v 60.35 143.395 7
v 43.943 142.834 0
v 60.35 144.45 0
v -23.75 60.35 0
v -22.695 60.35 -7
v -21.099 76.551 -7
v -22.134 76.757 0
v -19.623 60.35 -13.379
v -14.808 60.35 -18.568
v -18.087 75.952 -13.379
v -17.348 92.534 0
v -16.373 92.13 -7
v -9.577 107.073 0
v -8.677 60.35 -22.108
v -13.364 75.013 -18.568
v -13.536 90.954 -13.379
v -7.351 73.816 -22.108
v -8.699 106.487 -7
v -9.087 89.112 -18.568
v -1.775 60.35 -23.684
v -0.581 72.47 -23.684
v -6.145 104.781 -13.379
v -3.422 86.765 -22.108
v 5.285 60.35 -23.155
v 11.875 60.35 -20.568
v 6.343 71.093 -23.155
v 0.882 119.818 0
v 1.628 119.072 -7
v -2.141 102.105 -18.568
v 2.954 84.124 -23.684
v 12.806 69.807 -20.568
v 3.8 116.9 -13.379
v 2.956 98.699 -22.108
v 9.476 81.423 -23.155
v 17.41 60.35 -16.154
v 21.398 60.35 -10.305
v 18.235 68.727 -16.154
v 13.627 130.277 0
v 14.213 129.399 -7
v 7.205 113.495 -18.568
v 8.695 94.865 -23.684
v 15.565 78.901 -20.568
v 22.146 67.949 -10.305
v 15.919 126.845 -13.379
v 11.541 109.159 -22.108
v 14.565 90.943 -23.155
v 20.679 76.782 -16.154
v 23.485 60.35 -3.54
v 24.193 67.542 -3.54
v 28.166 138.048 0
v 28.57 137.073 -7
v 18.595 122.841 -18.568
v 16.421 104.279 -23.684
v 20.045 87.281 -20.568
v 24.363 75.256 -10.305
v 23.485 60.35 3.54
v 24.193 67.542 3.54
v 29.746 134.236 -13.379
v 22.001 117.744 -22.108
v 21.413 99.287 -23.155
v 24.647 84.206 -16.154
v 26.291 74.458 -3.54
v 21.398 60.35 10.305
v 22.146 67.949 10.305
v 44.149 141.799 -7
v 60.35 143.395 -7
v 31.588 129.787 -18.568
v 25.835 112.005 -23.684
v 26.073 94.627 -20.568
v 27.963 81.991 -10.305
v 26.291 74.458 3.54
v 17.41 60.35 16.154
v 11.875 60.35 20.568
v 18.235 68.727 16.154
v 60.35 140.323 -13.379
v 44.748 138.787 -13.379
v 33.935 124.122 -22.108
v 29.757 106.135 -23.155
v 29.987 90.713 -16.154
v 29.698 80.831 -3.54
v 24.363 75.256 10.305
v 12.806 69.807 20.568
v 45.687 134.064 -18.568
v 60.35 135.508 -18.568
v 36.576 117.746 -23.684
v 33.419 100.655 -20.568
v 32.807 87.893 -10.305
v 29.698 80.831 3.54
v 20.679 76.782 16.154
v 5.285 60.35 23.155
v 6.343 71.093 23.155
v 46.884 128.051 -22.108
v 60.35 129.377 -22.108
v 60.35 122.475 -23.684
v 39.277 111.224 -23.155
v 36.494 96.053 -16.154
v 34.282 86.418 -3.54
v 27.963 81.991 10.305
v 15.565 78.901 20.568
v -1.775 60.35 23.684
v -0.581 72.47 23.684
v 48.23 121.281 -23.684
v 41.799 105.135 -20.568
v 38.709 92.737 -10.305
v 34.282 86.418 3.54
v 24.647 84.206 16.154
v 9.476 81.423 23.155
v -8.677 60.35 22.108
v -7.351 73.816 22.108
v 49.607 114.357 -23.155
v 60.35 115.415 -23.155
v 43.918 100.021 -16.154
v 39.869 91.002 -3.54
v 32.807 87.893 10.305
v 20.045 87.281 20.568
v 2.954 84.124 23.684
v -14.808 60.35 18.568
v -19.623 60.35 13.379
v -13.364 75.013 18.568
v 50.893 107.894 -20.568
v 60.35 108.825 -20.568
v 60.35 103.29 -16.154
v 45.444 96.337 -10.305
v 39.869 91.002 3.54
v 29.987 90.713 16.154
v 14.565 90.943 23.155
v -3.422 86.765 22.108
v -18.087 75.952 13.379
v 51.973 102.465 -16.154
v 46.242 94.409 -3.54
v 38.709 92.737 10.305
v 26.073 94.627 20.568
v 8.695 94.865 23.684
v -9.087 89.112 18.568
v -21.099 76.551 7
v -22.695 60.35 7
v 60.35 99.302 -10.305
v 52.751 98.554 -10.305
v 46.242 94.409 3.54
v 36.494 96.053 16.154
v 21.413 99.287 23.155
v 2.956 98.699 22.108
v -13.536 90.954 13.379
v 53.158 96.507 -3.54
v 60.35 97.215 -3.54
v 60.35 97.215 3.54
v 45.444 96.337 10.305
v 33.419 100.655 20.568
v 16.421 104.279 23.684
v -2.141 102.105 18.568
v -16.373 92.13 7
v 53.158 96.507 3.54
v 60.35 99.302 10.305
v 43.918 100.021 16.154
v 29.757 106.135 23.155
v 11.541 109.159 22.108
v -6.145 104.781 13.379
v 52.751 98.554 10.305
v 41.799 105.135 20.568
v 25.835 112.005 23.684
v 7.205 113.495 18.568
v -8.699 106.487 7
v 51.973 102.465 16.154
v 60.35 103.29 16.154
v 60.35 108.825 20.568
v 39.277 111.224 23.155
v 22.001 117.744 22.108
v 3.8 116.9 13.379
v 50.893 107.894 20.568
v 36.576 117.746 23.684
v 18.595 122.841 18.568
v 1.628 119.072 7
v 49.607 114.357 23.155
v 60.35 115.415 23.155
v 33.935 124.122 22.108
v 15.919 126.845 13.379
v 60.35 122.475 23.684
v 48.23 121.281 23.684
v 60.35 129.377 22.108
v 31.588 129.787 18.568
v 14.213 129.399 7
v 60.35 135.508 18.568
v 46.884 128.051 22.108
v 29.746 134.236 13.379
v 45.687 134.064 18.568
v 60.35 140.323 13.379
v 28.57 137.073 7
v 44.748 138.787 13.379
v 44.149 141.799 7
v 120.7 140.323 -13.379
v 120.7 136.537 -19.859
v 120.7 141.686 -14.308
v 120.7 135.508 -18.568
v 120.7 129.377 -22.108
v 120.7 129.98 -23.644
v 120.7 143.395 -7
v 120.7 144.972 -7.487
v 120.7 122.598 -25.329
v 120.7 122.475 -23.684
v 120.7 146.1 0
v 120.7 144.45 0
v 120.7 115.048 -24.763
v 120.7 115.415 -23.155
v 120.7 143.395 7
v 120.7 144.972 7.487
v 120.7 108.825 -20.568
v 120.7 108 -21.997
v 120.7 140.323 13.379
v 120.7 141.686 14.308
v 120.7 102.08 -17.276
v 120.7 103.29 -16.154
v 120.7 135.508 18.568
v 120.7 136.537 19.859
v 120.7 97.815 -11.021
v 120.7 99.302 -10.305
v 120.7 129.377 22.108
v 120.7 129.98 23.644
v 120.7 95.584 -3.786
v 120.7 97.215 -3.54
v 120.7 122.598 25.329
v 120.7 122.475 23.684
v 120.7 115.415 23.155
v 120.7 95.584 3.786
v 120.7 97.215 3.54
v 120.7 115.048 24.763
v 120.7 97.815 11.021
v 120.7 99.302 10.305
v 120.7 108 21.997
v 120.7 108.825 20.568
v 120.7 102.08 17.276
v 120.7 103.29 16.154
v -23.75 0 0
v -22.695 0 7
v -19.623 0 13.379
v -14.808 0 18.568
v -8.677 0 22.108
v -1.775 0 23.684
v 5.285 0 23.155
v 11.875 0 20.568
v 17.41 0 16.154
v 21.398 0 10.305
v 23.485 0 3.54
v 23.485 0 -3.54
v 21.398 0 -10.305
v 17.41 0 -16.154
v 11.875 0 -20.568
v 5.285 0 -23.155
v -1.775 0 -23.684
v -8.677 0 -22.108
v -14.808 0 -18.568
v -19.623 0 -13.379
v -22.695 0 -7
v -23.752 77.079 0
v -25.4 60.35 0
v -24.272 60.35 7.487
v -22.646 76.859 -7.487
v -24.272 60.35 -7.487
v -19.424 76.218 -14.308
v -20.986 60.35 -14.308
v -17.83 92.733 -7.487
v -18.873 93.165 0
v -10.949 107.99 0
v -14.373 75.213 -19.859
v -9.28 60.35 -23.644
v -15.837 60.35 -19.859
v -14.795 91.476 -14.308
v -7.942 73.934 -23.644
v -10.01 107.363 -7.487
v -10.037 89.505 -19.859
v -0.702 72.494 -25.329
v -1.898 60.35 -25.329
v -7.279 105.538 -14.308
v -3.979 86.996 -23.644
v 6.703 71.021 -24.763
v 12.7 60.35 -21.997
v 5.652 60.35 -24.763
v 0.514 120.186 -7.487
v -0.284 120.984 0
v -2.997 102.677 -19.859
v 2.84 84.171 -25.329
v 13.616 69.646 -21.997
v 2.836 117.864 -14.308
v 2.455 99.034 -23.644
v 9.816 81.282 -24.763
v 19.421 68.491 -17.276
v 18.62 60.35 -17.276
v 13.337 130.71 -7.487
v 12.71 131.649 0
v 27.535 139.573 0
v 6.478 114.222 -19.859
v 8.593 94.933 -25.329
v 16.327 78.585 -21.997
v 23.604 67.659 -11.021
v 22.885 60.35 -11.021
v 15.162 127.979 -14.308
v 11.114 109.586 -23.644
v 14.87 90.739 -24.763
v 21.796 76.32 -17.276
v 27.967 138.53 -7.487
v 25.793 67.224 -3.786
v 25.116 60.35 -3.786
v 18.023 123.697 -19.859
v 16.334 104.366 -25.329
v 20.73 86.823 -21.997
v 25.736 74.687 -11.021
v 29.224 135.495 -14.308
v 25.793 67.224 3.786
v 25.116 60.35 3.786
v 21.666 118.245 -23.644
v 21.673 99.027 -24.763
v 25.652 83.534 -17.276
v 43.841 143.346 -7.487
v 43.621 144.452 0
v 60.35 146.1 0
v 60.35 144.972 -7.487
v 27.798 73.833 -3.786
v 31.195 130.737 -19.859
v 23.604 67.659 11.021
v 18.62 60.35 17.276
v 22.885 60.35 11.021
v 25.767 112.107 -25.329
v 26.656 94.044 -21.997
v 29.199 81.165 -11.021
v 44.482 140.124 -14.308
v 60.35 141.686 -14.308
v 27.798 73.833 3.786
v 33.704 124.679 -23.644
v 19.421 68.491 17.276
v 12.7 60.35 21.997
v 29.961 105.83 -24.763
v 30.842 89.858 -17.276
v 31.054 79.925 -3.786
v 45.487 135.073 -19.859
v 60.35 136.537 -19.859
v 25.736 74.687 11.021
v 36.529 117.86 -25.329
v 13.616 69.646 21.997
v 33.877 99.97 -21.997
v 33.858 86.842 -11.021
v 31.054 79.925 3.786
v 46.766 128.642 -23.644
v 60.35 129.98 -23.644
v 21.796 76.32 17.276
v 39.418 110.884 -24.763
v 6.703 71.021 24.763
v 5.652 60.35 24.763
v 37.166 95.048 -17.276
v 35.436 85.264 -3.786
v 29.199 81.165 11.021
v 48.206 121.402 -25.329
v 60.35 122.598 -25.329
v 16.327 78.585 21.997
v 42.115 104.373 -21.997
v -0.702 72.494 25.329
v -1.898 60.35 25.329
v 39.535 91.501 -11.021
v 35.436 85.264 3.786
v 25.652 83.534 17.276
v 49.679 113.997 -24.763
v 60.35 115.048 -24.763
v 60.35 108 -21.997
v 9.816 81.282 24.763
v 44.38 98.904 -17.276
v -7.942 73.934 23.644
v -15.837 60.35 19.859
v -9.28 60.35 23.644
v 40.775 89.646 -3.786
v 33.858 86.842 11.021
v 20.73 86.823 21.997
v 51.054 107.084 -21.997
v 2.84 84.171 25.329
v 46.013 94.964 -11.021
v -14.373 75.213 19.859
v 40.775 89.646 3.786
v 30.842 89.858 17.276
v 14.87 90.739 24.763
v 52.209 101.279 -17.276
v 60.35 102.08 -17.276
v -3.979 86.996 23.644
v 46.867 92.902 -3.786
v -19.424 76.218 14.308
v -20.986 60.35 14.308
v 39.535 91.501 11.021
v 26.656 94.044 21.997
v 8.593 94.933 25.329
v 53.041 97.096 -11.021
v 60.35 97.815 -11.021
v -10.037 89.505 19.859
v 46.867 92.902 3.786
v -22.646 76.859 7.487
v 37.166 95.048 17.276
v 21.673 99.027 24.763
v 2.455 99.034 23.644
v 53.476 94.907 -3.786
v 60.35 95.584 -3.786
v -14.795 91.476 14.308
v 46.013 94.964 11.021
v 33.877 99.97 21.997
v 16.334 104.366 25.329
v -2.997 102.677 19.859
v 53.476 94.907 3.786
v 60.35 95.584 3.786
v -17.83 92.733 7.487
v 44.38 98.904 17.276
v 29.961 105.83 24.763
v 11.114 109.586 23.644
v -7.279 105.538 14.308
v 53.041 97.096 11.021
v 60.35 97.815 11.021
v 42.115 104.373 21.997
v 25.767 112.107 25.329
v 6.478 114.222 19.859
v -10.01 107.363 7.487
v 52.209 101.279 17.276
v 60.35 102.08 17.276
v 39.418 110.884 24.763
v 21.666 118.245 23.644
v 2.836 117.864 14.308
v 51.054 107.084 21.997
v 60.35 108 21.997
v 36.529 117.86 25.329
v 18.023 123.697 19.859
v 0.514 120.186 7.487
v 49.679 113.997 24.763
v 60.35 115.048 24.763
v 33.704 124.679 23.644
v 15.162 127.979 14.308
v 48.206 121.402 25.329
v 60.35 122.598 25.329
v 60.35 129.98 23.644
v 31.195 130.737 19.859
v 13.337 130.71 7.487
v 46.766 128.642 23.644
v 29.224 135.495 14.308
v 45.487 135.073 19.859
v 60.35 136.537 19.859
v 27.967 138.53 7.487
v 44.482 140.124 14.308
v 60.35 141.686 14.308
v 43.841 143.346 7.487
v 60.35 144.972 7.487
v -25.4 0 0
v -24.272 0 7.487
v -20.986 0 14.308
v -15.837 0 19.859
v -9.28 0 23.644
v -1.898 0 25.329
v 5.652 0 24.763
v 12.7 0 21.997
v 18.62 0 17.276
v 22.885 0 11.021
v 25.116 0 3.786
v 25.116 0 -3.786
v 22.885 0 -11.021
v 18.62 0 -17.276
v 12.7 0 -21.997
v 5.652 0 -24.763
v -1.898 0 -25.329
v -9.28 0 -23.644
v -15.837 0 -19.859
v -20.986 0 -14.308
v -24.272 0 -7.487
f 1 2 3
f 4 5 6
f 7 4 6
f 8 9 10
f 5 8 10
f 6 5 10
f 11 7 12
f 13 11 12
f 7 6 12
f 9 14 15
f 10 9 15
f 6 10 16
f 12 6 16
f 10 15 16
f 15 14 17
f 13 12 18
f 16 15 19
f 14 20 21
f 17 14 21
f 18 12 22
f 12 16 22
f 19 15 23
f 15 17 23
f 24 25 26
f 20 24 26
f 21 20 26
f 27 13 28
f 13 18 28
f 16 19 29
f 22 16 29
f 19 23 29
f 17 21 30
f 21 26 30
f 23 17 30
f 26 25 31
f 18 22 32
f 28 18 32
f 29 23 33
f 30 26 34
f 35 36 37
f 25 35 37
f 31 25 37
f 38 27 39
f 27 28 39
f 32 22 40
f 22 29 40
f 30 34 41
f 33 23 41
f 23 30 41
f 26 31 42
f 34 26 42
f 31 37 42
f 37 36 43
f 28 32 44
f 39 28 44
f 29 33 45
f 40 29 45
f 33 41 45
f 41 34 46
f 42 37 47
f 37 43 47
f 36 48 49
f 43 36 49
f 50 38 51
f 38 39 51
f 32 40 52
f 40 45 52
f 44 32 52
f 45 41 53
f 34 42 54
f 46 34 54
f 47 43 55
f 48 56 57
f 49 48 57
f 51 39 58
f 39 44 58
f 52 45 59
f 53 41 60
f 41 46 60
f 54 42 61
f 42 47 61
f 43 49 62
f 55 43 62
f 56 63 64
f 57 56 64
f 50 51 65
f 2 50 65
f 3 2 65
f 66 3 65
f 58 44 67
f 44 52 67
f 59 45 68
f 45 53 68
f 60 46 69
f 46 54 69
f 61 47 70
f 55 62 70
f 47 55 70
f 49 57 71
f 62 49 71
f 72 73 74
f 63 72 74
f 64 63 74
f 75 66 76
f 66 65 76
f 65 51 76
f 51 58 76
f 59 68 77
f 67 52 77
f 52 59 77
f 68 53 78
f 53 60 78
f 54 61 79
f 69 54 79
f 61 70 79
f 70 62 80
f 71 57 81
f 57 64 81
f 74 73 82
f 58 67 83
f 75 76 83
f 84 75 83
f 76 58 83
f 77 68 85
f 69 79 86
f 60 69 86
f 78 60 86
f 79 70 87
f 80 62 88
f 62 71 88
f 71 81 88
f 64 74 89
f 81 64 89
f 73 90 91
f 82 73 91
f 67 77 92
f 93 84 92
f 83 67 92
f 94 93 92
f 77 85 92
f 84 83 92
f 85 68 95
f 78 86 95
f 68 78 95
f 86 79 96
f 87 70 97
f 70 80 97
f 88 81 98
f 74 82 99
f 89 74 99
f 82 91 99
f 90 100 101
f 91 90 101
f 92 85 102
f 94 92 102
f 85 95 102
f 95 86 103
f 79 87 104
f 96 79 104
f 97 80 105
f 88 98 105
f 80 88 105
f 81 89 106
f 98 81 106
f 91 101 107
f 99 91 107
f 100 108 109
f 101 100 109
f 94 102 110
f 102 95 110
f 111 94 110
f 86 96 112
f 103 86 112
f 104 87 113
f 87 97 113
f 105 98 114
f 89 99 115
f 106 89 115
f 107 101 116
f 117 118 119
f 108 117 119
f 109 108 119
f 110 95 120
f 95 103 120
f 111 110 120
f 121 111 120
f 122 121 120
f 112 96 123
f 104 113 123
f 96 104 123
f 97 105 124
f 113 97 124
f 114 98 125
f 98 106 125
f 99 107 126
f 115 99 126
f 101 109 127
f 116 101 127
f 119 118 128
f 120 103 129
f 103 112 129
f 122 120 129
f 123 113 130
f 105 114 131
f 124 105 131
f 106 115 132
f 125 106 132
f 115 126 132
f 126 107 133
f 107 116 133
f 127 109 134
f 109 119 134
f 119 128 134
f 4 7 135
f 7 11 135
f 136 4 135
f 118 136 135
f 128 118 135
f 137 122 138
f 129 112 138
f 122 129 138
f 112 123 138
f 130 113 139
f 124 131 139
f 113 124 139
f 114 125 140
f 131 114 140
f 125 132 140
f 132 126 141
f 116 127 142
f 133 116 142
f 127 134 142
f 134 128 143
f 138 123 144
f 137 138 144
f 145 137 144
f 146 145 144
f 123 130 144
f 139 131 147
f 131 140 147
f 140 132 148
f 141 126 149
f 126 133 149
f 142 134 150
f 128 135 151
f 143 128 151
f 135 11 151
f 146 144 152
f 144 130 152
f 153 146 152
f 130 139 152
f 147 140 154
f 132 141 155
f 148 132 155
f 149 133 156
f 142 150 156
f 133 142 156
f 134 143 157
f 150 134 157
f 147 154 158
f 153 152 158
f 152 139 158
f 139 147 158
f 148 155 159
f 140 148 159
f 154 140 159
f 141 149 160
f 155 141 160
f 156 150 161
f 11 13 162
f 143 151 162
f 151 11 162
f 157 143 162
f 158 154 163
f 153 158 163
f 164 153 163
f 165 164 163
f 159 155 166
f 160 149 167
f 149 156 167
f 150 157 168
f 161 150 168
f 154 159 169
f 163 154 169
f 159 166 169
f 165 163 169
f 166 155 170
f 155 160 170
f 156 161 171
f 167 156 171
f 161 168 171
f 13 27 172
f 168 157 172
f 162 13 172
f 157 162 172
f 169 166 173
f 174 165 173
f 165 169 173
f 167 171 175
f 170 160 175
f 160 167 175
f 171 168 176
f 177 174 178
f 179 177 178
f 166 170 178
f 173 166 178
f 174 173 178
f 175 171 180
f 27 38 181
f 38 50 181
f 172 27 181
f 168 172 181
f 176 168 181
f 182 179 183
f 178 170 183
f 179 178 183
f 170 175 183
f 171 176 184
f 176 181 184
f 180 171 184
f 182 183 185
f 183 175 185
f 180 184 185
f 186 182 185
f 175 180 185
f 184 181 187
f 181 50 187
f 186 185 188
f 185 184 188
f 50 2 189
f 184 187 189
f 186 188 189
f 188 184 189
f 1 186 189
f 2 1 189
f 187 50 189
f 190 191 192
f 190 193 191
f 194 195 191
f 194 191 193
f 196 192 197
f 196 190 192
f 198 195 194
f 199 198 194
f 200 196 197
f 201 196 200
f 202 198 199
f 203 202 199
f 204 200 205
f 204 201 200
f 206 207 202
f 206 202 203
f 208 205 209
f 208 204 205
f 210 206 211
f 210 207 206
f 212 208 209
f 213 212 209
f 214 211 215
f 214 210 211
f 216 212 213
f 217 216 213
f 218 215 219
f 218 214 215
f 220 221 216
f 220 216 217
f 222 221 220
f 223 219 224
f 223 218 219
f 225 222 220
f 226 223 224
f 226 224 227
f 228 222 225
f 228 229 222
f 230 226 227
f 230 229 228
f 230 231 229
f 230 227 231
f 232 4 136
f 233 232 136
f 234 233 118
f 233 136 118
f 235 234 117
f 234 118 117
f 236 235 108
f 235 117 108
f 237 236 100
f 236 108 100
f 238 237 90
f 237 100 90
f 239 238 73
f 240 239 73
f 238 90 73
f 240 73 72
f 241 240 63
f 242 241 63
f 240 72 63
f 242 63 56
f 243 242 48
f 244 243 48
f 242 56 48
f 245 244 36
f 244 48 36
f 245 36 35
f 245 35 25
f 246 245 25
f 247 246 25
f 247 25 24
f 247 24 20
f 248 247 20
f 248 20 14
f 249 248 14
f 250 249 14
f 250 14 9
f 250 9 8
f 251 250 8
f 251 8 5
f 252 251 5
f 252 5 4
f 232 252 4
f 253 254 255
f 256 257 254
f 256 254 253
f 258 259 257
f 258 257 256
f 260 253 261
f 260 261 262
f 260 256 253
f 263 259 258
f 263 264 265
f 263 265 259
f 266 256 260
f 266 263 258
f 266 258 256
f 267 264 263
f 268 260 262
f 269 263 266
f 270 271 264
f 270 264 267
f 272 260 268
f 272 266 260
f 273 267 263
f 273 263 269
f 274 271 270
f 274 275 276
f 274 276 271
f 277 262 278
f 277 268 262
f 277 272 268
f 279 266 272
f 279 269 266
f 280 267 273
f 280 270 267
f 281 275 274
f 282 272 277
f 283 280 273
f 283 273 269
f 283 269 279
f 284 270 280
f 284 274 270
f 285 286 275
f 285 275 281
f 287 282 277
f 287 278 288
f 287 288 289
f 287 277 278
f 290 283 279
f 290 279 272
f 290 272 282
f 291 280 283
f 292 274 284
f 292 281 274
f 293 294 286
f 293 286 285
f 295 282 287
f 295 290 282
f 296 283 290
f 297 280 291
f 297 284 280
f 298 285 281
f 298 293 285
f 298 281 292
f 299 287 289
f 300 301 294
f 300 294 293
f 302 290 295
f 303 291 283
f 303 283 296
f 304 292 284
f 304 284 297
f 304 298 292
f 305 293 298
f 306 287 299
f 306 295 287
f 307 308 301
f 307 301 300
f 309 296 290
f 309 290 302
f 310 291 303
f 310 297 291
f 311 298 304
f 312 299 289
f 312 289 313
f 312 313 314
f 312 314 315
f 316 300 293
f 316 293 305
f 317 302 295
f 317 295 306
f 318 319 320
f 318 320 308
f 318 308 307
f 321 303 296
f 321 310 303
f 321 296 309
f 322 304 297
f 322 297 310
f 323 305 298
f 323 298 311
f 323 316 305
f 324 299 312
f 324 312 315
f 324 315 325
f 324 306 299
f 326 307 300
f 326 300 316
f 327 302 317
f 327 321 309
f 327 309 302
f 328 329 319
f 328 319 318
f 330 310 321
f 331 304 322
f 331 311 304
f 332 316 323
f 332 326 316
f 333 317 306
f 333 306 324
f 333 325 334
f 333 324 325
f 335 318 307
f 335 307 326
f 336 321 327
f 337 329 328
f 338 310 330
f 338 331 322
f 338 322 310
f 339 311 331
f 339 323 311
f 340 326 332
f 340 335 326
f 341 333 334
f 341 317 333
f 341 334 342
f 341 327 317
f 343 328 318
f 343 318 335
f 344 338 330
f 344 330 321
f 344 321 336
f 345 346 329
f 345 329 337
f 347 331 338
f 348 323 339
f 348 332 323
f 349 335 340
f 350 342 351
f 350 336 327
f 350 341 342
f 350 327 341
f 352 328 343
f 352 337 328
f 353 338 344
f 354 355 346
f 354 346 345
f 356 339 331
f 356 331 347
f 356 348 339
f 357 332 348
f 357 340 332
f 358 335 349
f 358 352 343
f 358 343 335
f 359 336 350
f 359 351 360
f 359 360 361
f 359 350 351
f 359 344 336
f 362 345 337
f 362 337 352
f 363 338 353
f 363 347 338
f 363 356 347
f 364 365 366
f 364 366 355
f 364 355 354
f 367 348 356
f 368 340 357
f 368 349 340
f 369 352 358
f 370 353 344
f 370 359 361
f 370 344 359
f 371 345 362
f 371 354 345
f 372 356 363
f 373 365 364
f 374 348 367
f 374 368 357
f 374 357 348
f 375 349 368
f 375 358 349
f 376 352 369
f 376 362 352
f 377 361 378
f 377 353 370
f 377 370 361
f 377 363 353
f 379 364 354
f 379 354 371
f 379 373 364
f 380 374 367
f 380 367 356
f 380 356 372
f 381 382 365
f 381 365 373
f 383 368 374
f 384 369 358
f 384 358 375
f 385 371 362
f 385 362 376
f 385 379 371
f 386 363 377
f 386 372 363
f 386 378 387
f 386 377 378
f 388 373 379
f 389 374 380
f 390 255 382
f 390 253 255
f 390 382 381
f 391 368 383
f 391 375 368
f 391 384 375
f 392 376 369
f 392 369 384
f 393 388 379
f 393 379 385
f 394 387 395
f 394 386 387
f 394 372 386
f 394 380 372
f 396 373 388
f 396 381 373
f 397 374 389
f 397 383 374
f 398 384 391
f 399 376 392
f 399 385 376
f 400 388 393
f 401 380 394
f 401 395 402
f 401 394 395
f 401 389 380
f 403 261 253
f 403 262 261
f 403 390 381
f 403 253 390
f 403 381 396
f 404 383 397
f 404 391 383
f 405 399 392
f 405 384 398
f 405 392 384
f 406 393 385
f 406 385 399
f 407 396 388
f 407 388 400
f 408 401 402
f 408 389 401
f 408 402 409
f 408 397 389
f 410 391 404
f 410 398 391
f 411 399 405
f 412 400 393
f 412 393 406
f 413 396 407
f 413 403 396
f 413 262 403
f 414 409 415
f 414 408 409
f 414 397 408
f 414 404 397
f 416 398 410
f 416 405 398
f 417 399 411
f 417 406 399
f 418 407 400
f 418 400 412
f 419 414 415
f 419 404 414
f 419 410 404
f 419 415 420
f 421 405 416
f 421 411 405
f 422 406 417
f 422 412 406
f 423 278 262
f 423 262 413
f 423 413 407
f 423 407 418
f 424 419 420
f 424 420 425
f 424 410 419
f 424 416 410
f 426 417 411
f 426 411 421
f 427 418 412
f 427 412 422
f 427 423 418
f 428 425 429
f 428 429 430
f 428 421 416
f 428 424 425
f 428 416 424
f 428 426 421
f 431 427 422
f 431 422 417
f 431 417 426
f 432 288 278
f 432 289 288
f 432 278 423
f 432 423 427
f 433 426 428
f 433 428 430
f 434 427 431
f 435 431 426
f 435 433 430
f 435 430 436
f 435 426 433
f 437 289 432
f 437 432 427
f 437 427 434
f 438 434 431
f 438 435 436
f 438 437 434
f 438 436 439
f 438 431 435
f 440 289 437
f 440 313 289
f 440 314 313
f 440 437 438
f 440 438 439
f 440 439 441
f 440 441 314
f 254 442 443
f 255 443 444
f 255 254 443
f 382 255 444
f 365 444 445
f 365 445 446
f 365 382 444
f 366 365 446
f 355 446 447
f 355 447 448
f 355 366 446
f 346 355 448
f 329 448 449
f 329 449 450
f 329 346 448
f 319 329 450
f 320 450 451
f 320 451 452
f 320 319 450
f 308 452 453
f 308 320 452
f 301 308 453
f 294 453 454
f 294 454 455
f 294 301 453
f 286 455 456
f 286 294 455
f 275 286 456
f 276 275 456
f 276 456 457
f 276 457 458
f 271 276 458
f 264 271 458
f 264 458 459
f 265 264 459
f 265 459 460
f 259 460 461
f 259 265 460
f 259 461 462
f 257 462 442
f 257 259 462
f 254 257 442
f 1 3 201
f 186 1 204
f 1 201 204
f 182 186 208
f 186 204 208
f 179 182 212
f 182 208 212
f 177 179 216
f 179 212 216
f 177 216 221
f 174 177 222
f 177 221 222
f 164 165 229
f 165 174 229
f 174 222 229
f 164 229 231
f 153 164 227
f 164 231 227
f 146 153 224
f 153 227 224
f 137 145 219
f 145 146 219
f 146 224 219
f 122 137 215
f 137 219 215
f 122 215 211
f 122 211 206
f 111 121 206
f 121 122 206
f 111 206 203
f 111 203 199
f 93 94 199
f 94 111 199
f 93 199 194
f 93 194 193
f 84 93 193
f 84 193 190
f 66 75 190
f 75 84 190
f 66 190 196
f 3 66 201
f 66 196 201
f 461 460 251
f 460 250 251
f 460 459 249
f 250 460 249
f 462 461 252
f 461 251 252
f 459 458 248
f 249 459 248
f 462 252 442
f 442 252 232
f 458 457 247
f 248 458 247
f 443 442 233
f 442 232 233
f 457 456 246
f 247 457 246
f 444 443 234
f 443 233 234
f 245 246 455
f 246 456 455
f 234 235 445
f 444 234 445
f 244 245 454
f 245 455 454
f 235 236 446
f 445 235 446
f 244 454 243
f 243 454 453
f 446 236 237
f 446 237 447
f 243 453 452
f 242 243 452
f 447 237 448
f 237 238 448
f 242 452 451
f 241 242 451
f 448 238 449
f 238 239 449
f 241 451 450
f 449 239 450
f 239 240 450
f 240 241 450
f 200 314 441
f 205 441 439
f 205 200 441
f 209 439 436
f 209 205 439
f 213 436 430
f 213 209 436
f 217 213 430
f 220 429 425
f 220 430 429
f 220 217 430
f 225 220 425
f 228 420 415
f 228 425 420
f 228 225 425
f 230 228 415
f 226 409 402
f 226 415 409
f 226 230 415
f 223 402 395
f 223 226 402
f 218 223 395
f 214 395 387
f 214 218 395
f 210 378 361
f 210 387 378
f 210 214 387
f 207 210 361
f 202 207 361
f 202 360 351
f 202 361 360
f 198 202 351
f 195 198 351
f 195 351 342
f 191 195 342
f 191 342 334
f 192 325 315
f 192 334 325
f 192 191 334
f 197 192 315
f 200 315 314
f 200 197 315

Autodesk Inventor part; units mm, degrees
ref_plane "YZ Plane" through (0, 0, 0) normal (1, 0, 0) x (0, 1, 0)
ref_plane "XZ Plane" through (0, 0, 0) normal (0, 1, 0) x (-1, 0, 0)
ref_plane "XY Plane" through (0, 0, 0) normal (0, 0, 1) x (1, 0, 0)
sketch "Sketch1" plane through (0, 0, 0) normal (0, 0, 1) x (1, 0, 0)
  line L0 (0, 0) -> (0, 60.35)
  line L1 (60.35, 120.7) -> (120.7, 120.7)
  arc A0 (60.35, 120.7) -> (0, 60.35) centre (60.35, 60.35) ccw
  dimension "d0" = 120.7
  dimension "d1" = 120.7
  dimension "d2" = 60.35
sketch "Sketch2" plane through (0, 0, 0) normal (0, 1, 0) x (-1, 0, 0)
  circle A0 centre (0, 0) radius 25.4
  circle A1 centre (0, 0) radius 23.75
  dimension "d4" = 1.65
  dimension "d5" = 50.8
sweep "Sweep1" add profiles "Sketch2" path "Sketch1"
equation "\"d1\" = d0"
equation "\"d2\" = 0.5 * d0"
properties part number "ASME BPE 90DEG ELB-50.8"
